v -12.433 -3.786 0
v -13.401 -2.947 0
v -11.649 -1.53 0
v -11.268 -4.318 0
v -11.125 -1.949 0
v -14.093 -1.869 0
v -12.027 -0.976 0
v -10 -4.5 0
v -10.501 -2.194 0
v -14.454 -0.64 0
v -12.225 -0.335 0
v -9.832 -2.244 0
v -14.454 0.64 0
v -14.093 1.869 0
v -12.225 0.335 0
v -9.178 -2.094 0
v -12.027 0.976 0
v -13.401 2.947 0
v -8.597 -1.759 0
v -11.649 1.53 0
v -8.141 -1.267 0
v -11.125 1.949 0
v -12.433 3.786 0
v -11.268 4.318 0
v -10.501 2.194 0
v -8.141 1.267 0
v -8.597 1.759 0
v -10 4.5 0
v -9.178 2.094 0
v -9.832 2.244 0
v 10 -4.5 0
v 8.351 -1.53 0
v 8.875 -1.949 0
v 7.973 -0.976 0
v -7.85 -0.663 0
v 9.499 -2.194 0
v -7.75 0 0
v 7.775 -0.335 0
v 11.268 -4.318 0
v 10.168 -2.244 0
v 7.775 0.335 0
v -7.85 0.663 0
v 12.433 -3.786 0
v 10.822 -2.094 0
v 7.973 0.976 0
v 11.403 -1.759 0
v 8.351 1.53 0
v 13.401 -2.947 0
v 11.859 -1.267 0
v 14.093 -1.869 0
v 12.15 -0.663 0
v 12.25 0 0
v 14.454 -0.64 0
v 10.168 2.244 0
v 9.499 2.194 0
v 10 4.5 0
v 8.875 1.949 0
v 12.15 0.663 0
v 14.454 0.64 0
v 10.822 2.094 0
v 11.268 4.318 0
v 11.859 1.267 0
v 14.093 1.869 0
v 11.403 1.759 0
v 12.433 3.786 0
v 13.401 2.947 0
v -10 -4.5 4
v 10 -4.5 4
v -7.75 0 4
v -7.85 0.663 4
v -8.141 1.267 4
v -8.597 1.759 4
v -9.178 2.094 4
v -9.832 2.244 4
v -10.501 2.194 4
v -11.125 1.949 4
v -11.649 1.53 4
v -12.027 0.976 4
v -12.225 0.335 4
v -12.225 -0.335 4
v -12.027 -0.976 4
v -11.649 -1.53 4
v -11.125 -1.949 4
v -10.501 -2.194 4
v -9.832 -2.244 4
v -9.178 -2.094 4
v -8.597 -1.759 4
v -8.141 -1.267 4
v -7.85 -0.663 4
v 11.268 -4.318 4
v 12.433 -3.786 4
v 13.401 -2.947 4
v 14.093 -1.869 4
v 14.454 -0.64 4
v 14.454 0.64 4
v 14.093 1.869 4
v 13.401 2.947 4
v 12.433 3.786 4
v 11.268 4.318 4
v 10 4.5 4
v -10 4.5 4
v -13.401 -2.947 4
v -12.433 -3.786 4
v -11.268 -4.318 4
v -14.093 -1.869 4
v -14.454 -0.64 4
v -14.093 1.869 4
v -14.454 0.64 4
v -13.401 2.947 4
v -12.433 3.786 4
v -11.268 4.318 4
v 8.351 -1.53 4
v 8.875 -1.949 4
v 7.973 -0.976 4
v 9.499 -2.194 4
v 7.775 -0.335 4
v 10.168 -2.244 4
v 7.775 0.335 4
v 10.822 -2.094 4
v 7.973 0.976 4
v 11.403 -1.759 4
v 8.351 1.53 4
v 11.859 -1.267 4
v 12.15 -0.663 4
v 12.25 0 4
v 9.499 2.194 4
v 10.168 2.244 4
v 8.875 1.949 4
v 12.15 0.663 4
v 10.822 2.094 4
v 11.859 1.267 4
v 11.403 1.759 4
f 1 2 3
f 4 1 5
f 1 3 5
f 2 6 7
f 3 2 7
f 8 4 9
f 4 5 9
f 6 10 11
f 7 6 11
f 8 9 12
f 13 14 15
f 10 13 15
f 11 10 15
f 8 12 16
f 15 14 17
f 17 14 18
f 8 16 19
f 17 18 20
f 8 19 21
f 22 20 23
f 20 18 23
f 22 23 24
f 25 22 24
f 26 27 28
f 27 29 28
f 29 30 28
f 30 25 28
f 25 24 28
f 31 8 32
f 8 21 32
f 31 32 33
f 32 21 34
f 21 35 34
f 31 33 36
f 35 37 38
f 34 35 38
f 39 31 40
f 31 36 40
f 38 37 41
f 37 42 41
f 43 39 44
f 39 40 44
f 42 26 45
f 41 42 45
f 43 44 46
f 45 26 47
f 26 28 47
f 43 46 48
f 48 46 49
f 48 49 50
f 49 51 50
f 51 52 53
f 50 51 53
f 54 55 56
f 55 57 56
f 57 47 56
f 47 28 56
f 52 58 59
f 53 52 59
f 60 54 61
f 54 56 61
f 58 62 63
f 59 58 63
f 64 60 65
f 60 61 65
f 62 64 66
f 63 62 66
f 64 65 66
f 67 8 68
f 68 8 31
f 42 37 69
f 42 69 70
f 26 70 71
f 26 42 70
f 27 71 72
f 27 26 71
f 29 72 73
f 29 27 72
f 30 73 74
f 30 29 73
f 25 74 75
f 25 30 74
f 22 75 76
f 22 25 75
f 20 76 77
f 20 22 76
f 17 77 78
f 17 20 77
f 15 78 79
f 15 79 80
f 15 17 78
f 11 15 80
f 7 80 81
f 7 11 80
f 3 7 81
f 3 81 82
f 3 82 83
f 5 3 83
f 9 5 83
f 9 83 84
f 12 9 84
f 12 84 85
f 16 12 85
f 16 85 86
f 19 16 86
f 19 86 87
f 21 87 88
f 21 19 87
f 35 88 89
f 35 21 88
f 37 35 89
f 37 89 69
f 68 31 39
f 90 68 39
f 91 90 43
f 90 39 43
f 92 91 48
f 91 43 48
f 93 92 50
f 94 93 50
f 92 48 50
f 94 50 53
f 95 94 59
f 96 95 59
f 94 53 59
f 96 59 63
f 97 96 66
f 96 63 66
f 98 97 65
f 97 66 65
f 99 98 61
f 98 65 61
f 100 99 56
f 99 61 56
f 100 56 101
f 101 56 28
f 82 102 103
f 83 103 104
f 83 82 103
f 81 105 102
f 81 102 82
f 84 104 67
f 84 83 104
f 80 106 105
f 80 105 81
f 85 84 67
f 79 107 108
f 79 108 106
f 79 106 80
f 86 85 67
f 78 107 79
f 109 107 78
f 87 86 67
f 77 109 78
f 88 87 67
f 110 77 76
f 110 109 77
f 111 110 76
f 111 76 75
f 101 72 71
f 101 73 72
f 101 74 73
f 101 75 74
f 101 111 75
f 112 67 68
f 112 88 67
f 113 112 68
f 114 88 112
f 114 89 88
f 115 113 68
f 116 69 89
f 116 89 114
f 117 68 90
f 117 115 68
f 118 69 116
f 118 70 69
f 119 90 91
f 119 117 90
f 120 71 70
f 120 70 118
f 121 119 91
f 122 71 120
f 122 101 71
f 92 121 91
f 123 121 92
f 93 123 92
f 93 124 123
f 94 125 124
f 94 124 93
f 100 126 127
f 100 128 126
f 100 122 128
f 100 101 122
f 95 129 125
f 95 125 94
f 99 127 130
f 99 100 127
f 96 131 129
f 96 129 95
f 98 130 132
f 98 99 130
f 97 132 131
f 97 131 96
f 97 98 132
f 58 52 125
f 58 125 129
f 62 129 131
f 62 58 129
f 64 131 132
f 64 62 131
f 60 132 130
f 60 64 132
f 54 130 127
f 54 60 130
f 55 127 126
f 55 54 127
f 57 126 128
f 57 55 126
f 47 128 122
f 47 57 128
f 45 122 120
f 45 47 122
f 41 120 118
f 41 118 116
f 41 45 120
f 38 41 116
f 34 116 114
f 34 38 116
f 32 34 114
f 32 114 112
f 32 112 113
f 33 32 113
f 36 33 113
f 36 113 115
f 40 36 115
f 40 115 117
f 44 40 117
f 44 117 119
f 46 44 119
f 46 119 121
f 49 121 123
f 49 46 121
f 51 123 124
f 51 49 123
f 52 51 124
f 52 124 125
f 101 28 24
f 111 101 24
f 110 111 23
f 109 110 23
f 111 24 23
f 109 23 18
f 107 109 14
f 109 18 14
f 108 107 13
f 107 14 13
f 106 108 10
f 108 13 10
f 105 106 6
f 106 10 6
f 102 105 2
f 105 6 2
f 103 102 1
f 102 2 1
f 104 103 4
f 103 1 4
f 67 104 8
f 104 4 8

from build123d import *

# Parameters (mm, degrees)
SKETCH1_R           = 4.5
SKETCH1_R_2         = 2.25
BOSS_EXTRUDE1_DEPTH = 4


with BuildPart() as part:
    # Sketch1 → Boss-Extrude1 (new body)
    with BuildSketch(Plane.XY):
        with Locations((-10, 0)):
            Circle(SKETCH1_R)
        with Locations((-10, 0)):
            Circle(SKETCH1_R_2, mode=Mode.SUBTRACT)
        with BuildLine():
            Line((10, 4.5), (-10, 4.5))
            ThreePointArc((-10, 4.5), (-6.818019485, 3.181980515), (-5.5, 0))
            ThreePointArc((-5.5, 0), (-6.818019485, -3.181980515), (-10, -4.5))
            Line((-10, -4.5), (10, -4.5))
            ThreePointArc((10, -4.5), (5.5, 0), (10, 4.5))
        make_face()
        with Locations((10, 0)):
            Circle(SKETCH1_R)
        with Locations((10, 0)):
            Circle(SKETCH1_R_2, mode=Mode.SUBTRACT)
    extrude(amount=BOSS_EXTRUDE1_DEPTH)


solid = part.part
